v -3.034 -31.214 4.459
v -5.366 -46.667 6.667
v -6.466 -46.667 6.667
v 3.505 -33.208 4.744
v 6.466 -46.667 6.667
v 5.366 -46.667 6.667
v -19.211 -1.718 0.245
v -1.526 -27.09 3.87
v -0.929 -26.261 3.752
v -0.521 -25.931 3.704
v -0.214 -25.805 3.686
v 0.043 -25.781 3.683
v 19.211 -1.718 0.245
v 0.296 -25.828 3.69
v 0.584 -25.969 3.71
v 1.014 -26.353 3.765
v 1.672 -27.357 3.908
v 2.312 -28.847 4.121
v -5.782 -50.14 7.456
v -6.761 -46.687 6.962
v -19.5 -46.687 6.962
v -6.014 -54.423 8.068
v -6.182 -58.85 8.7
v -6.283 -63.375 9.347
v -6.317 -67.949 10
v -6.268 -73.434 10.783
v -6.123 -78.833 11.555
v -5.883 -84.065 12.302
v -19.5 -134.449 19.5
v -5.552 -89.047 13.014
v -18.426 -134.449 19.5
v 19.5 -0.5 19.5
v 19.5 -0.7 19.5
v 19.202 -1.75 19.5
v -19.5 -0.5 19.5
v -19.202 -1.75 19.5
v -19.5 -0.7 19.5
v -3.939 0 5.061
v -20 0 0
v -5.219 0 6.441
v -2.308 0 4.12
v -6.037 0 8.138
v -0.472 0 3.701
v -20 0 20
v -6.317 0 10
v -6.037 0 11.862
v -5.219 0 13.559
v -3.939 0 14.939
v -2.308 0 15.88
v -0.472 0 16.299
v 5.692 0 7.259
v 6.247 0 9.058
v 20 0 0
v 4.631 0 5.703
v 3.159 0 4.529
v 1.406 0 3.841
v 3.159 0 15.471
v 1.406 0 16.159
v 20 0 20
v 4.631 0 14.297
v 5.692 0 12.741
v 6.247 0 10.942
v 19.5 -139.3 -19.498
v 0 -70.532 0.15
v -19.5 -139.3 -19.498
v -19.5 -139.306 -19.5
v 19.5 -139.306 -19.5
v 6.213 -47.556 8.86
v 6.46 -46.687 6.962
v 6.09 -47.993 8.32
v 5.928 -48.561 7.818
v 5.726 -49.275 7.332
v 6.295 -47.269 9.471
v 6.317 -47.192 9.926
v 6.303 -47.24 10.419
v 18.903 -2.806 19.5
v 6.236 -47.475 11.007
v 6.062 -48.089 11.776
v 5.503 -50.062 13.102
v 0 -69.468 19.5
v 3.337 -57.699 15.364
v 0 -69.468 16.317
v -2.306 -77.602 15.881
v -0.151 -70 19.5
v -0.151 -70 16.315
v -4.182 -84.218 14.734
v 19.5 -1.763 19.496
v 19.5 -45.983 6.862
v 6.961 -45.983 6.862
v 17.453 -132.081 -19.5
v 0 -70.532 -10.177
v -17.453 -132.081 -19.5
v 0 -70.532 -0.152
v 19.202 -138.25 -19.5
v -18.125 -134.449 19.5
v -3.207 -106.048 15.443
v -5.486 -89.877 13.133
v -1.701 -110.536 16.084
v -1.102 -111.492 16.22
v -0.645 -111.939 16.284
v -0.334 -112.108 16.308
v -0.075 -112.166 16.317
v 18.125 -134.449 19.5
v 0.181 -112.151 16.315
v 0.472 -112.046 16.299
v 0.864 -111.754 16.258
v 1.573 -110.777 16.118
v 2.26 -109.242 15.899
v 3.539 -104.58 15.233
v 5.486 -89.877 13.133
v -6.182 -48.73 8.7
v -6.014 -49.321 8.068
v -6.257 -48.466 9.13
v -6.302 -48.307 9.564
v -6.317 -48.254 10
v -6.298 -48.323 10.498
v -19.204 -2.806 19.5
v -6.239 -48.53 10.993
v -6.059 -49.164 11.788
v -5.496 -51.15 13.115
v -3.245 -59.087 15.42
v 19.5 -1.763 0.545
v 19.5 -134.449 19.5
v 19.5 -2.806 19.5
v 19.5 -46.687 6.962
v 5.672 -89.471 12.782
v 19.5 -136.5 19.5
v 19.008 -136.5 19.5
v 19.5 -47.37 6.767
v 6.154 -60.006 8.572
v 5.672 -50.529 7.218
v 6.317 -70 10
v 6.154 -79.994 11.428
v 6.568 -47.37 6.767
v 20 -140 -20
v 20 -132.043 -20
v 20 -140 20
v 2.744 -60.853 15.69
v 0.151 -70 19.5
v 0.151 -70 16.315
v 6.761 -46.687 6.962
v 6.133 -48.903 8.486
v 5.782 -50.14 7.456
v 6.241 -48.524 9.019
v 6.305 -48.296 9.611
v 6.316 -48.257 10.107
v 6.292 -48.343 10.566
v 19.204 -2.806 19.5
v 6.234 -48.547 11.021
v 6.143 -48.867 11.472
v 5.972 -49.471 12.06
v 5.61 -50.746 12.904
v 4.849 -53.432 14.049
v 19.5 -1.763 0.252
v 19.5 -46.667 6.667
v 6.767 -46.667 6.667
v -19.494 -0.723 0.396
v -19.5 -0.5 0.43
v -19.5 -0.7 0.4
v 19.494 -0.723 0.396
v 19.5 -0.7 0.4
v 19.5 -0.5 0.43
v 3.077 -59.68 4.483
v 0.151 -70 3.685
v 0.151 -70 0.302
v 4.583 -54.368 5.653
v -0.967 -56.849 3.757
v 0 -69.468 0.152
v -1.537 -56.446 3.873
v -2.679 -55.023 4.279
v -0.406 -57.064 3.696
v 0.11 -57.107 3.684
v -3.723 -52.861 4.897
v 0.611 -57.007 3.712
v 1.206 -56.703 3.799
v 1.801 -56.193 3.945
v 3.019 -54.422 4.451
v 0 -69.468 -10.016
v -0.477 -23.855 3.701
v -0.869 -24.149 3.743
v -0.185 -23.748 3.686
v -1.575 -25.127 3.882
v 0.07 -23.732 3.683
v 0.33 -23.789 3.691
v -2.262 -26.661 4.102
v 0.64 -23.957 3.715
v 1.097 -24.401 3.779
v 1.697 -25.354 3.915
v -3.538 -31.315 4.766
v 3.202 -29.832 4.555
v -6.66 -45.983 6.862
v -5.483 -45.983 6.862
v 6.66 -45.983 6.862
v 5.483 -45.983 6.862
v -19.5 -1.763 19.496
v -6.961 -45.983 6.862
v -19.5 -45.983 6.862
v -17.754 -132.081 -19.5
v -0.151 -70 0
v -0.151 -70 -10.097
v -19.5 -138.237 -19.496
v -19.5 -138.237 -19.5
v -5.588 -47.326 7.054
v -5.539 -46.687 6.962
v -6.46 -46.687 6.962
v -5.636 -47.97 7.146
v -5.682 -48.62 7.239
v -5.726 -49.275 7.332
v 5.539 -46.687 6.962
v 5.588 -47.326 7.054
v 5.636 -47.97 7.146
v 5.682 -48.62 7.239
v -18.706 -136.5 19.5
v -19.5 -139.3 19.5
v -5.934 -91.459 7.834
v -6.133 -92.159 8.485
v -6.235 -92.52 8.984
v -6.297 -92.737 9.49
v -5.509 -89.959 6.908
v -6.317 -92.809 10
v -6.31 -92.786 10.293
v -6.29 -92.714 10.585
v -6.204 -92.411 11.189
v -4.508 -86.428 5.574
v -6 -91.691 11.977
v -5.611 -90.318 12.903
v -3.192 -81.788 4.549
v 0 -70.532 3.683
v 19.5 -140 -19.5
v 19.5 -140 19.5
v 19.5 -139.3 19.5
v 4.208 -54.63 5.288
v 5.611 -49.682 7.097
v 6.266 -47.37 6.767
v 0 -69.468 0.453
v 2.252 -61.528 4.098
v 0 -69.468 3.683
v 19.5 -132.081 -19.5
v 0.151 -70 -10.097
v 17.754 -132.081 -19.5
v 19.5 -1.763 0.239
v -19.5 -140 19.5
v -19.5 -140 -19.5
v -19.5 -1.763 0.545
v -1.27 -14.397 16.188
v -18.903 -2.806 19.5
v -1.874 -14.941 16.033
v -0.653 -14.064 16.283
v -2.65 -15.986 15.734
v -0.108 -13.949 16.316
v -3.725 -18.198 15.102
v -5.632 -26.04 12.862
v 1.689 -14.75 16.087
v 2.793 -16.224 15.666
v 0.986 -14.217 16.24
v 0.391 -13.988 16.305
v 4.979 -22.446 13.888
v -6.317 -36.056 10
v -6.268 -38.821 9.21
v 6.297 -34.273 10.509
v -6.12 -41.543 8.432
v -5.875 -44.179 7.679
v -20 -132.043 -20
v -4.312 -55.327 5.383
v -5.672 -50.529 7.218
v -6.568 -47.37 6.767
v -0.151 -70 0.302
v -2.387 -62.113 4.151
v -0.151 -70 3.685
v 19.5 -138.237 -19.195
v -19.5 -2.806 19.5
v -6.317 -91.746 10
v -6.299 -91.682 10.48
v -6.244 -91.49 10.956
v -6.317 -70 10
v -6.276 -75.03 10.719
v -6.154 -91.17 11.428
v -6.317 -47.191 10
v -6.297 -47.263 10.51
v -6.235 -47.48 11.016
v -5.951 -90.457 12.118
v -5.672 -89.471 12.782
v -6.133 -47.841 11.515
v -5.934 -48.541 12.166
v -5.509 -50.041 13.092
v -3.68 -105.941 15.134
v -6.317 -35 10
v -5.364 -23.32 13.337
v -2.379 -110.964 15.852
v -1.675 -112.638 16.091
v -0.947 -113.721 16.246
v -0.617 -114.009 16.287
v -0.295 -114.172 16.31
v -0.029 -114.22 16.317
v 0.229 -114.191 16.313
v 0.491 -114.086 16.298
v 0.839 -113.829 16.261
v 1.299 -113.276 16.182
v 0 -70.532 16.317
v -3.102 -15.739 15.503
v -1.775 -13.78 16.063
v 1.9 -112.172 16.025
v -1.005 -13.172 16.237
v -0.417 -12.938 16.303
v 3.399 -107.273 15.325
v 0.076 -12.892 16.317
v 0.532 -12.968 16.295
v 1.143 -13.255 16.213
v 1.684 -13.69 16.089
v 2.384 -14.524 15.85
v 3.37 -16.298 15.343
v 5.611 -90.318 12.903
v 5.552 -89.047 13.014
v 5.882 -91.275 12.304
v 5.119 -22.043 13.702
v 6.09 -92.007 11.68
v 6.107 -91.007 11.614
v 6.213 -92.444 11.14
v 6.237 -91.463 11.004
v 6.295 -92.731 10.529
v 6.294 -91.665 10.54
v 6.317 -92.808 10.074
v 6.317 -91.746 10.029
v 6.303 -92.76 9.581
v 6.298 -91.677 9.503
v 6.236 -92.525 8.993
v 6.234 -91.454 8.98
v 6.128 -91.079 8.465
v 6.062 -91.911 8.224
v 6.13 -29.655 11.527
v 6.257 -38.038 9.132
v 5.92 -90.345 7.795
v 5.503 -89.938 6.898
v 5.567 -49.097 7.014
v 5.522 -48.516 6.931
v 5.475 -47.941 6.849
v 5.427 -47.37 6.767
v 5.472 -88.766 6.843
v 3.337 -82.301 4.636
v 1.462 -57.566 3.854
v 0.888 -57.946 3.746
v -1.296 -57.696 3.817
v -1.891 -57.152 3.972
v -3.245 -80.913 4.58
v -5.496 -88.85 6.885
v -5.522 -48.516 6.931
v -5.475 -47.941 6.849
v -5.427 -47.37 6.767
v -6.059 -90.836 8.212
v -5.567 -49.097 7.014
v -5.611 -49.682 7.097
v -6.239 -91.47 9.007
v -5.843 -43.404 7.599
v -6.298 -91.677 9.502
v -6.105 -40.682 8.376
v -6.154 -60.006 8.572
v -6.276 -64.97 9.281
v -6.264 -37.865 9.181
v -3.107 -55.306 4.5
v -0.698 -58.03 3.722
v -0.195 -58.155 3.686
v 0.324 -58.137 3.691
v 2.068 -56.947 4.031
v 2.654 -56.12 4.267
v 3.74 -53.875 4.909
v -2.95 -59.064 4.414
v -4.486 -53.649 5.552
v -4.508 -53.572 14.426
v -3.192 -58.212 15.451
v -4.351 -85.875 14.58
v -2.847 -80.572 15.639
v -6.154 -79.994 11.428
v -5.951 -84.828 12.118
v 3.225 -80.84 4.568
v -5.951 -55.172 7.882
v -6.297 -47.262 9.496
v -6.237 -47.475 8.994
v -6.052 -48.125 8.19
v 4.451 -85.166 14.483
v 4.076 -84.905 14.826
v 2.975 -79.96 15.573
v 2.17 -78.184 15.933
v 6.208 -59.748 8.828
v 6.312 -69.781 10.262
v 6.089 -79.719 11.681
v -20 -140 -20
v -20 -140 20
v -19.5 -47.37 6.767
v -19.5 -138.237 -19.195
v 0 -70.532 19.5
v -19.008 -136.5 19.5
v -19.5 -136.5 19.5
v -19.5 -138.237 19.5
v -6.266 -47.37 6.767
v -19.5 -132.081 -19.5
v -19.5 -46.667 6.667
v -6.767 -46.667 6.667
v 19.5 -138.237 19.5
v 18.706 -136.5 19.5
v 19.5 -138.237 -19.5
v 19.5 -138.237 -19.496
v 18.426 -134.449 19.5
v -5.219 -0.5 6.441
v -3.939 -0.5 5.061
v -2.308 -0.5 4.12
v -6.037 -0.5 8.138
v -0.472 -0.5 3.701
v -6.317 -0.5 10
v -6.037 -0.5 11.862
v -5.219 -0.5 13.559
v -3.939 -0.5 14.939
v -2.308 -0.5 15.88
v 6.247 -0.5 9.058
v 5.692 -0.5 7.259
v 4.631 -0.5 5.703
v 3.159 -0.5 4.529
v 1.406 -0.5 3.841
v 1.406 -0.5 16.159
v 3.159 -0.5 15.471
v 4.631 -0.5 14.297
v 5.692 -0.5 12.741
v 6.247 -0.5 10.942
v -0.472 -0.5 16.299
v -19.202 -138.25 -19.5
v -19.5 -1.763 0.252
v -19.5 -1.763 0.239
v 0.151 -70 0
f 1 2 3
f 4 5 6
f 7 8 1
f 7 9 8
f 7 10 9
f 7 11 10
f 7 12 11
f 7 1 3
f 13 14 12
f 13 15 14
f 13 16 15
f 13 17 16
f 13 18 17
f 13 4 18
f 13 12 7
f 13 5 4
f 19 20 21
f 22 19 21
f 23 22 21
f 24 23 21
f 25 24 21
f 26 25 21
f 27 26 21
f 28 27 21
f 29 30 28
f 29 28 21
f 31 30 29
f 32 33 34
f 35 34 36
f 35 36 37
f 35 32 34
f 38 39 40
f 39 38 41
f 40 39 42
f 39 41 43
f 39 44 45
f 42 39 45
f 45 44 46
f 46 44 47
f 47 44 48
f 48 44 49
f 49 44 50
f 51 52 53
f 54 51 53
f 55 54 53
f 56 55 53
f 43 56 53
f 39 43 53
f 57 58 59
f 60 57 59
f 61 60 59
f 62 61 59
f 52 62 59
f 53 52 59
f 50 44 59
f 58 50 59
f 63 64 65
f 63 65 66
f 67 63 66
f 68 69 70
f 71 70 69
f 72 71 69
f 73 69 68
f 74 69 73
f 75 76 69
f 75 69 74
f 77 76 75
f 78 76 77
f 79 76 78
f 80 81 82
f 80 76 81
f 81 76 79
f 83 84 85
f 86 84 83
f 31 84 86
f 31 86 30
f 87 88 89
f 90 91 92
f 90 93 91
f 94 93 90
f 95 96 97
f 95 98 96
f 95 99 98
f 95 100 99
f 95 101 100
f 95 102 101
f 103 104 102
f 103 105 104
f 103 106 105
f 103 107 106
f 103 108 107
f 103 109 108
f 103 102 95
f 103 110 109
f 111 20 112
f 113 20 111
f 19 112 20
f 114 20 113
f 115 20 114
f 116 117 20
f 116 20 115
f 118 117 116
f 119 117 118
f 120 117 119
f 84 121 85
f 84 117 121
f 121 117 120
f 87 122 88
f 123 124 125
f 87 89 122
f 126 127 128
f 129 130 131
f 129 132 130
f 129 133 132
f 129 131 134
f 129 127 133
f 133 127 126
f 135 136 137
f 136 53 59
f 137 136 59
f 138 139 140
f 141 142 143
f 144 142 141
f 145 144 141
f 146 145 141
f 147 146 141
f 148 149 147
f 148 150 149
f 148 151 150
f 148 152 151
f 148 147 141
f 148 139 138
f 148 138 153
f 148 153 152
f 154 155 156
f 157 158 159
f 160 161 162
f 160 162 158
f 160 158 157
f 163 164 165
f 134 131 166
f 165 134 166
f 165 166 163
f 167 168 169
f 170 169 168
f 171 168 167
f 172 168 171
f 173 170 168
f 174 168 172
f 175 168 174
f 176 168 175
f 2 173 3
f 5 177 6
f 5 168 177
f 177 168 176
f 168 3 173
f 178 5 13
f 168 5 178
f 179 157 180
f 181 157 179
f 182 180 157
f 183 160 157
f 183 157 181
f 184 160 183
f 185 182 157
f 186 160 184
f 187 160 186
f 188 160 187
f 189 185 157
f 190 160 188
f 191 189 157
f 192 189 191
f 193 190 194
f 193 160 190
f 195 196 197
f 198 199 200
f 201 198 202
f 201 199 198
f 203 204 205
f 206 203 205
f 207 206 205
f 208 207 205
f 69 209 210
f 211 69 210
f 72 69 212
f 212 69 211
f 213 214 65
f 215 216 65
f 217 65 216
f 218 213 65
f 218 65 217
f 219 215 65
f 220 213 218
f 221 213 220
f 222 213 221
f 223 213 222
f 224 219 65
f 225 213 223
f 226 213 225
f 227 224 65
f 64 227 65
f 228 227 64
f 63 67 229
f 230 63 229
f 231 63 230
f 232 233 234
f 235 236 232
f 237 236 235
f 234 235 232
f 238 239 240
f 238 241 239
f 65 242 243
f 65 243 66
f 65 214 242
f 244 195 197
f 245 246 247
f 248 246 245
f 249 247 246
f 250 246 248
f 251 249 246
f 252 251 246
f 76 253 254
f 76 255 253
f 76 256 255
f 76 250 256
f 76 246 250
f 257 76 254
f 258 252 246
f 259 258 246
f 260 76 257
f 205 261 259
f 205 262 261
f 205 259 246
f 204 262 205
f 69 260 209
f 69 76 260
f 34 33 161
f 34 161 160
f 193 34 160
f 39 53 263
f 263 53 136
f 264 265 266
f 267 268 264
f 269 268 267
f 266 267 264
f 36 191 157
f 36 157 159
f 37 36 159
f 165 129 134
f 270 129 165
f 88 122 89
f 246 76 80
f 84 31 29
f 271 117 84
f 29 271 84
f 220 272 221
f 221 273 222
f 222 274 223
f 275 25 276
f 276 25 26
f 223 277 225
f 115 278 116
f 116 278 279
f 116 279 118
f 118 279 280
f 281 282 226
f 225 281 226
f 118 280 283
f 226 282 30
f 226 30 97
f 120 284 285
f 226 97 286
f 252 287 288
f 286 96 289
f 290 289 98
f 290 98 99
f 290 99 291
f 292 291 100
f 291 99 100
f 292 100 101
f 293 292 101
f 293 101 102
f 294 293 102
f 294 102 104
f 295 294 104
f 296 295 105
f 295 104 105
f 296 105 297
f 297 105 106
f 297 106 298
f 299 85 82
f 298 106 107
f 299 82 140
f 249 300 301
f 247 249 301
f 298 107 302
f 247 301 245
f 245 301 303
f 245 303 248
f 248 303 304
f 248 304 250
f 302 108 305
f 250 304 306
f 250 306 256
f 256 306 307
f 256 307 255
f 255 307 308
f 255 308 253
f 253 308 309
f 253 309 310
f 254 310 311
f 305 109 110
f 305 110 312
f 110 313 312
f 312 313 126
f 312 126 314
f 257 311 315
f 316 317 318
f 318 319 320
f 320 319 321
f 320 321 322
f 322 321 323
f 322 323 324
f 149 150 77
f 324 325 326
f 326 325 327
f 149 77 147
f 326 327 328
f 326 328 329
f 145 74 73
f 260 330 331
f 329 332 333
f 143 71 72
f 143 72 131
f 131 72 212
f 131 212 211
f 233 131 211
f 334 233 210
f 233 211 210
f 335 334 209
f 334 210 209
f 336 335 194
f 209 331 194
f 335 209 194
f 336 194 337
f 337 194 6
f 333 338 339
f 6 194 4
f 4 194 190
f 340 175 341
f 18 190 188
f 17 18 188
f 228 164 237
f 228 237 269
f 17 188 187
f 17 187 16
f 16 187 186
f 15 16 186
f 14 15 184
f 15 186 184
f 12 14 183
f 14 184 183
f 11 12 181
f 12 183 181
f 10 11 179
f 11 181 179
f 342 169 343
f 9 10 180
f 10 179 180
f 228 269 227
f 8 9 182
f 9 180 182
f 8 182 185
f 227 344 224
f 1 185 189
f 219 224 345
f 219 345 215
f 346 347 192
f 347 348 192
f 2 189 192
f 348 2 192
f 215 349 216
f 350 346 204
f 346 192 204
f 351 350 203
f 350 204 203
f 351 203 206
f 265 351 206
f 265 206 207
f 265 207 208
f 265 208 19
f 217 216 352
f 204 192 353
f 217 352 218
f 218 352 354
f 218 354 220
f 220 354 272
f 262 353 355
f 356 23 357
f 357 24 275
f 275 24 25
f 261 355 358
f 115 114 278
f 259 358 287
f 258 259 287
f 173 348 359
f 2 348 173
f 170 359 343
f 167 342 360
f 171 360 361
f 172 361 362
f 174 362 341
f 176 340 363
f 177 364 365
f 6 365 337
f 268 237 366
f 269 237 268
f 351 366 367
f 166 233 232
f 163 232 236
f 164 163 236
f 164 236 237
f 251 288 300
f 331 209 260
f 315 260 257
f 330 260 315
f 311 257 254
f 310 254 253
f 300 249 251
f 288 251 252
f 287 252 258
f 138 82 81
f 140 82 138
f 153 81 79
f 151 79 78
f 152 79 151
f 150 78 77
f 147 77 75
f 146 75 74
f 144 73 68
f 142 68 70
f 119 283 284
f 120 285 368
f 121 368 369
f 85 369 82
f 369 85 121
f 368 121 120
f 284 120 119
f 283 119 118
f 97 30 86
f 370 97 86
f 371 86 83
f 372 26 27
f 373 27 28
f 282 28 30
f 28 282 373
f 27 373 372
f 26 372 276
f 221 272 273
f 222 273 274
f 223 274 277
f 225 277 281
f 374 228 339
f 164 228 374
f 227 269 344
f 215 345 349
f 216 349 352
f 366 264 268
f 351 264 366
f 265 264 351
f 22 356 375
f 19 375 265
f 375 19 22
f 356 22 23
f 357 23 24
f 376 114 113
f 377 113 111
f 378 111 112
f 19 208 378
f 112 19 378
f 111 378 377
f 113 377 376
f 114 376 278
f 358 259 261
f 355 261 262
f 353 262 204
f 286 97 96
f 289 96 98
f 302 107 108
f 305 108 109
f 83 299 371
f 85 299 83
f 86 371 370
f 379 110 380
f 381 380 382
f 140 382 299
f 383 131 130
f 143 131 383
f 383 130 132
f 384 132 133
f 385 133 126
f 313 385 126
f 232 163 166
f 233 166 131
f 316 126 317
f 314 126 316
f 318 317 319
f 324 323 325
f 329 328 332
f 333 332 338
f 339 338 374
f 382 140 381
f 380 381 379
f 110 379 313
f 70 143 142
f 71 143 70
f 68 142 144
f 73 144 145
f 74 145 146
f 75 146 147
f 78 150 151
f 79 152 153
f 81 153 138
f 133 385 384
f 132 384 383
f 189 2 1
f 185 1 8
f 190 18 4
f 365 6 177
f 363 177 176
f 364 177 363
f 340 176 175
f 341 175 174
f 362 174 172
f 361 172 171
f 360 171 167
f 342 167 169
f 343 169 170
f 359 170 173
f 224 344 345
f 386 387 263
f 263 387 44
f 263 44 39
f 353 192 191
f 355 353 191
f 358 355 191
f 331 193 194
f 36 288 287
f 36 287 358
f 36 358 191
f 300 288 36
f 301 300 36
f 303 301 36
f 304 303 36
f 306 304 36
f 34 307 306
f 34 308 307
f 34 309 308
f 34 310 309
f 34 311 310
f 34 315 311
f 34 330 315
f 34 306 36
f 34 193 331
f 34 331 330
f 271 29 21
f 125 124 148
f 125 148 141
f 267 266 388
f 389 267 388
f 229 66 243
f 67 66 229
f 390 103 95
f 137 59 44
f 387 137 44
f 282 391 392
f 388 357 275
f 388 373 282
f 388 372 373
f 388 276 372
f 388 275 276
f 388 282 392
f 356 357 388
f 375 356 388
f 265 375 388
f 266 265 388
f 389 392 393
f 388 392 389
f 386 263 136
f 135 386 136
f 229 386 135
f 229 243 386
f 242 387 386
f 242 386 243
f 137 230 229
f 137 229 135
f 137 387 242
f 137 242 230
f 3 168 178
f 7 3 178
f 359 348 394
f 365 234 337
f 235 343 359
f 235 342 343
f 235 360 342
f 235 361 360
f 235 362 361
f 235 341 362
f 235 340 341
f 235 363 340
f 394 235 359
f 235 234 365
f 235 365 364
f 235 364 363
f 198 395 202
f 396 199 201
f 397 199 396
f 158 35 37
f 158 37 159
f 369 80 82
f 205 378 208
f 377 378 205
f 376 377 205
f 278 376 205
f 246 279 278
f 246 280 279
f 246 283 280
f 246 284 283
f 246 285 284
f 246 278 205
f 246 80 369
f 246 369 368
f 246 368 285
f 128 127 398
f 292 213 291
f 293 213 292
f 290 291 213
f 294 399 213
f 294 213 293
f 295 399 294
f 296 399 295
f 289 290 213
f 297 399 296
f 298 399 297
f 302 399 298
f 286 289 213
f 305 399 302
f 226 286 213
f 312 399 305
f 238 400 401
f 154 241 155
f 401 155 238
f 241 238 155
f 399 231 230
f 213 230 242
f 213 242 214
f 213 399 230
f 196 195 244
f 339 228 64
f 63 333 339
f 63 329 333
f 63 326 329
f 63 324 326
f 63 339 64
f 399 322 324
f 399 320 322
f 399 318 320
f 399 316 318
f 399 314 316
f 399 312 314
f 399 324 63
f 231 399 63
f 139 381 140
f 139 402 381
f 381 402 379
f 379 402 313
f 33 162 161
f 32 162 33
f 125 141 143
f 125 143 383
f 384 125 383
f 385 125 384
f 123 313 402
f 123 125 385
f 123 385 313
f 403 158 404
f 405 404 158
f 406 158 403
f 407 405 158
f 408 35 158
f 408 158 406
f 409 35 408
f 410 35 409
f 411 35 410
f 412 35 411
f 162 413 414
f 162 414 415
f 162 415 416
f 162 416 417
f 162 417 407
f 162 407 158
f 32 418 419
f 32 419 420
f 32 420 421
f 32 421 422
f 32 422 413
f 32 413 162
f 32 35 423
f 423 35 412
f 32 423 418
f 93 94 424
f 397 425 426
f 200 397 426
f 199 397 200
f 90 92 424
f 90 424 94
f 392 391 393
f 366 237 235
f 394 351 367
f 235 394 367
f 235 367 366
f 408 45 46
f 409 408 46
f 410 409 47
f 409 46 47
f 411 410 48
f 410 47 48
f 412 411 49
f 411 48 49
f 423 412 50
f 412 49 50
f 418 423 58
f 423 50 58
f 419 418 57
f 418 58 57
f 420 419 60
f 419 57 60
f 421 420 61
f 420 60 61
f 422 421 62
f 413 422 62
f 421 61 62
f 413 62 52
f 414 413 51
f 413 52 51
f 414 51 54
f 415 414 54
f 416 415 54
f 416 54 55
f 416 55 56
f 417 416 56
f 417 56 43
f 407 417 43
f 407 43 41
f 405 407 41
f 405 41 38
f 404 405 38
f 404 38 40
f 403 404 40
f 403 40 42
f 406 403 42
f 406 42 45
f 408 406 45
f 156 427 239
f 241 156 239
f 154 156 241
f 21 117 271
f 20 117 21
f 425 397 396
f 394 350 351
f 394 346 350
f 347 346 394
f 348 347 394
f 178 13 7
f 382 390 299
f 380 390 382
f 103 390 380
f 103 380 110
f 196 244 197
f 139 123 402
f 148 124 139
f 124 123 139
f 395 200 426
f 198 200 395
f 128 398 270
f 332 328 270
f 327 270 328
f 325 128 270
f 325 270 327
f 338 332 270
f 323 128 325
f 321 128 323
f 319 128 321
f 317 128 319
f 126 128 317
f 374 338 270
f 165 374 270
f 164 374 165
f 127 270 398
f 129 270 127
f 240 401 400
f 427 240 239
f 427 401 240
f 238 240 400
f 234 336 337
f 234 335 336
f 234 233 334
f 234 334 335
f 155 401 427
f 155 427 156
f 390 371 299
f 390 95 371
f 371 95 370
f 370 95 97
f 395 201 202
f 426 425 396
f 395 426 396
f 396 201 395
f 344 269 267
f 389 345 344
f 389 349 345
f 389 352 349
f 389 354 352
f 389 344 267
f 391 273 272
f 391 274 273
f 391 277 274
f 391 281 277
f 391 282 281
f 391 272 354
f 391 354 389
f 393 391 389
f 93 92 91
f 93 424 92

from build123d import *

# Parameters (mm, degrees)
F0_W      = 34
F0_H      = 1.332180649
F0_W_2    = 3
F0_H_2    = 30
F1_DEPTH  = 140
F3_DEPTH  = 50
F4_DEPTH  = 40
F5_T      = -0.5
F7_REACH  = 112.8020988928
F9_DEPTH  = 40
F11_DEPTH = 1000
F12_R     = 6.3171610822
F13_DEPTH = 140


# Not quite as in the source:
# - a feature names something its author has since deleted; it is built from what else it names


with BuildPart() as f1:
    # F0 (on Front) → F1 (new body)
    with BuildSketch(Plane.XZ):
        Polygon((20, 20), (17, 20), (17, 18.832180649), (17, 17.5), (17, 15), (20, 15), align=None)
        Polygon((15, 20), (-15, 20), (-17, 20), (-17, 18.832180649), (17, 18.832180649), (17, 20), align=None)
        with Locations((0, 18.1660903245)):
            Rectangle(F0_W, F0_H)
        Polygon((17, 17.5), (-17, 17.5), (-17, 15), (-17, -15), (-15, -15), (15, -15), (17, -15), (17, 15), align=None)
        Polygon((-18.5, 15), (-20, 15), (-20, -11.8550653383), (-20, -15), (-18.5, -15), (-18.5, -5.2632528394), (-18.5, -3.2632528394), (-18.5, 2.7367471606), (-18.5, 4.7367471606), align=None)
        with Locations((18.5, 0)):
            Rectangle(F0_W_2, F0_H_2)
        with BuildLine():
            Line((-15, -20), (15, -20))
            Line((15, -20), (15, -17.5))
            Line((15, -17.5), (11.391207267, -17.5))
            ThreePointArc((11.391207267, -17.5), (10.2485464886, -18.6426607784), (9.1058857102, -17.5))
            Line((9.1058857102, -17.5), (7.9234171988, -17.5))
            ThreePointArc((7.9234171988, -17.5), (5.948765669, -19.4746515298), (3.9741141393, -17.5))
            Line((3.9741141393, -17.5), (2.0740236579, -17.5))
            ThreePointArc((2.0740236579, -17.5), (0, -19.5740236579), (-2.0740236579, -17.5))
            Line((-2.0740236579, -17.5), (-3.9741141393, -17.5))
            ThreePointArc((-3.9741141393, -17.5), (-5.948765669, -19.4746515298), (-7.9234171988, -17.5))
            Line((-7.9234171988, -17.5), (-9.1058857102, -17.5))
            ThreePointArc((-9.1058857102, -17.5), (-10.2485464886, -18.6426607784), (-11.391207267, -17.5))
            Line((-11.391207267, -17.5), (-15, -17.5))
            Line((-15, -17.5), (-15, -20))
        make_face()
        Polygon((20, -20), (20, -15), (17, -15), (15, -15), (15, -17.5), (15, -20), align=None)
        Polygon((-17, -15), (-17, 15), (-18.5, 15), (-18.5, 4.7367471606), (-18.5, 2.7367471606), (-18.5, -3.2632528394), (-18.5, -5.2632528394), (-18.5, -15), align=None)
        Polygon((-15, -17.5), (-15, -15), (-16.767766953, -16.767766953), (-17.5, -17.5), (-15, -20), align=None)
        Polygon((-15, -15), (-17, -15), (-18.5, -15), (-20, -15), (-17.5, -17.5), (-16.767766953, -16.767766953), align=None)
        Polygon((-17, 18.832180649), (-17, 20), (-20, 20), (-20, 15), (-18.5, 15), (-17, 15), (-17, 17.5), align=None)
        Polygon((-17.5, -17.5), (-20, -15), (-20, -20), (-15, -20), align=None)
        with BuildLine():
            Line((3.9741141393, -17.5), (7.9234171988, -17.5))
            ThreePointArc((7.9234171988, -17.5), (5.948765669, -15.5253484702), (3.9741141393, -17.5))
        make_face()
        with BuildLine():
            ThreePointArc((3.9741141393, -17.5), (5.948765669, -19.4746515298), (7.9234171988, -17.5))
            Line((7.9234171988, -17.5), (3.9741141393, -17.5))
        make_face()
        with BuildLine():
            ThreePointArc((9.1058857102, -17.5), (10.2485464886, -18.6426607784), (11.391207267, -17.5))
            Line((11.391207267, -17.5), (9.1058857102, -17.5))
        make_face()
        with BuildLine():
            Line((9.1058857102, -17.5), (11.391207267, -17.5))
            ThreePointArc((11.391207267, -17.5), (10.2485464886, -16.3573392216), (9.1058857102, -17.5))
        make_face()
        with BuildLine():
            ThreePointArc((2.0740236579, -17.5), (0, -15.4259763421), (-2.0740236579, -17.5))
            Line((-2.0740236579, -17.5), (2.0740236579, -17.5))
        make_face()
        with BuildLine():
            Line((2.0740236579, -17.5), (-2.0740236579, -17.5))
            ThreePointArc((-2.0740236579, -17.5), (0, -19.5740236579), (2.0740236579, -17.5))
        make_face()
        with BuildLine():
            Line((-3.9741141393, -17.5), (-7.9234171988, -17.5))
            ThreePointArc((-7.9234171988, -17.5), (-5.948765669, -19.4746515298), (-3.9741141393, -17.5))
        make_face()
    extrude(amount=F1_DEPTH)


with BuildPart() as f1b:
    # F0 (on Front) → F1, piece 2 (new body)
    with BuildSketch(Plane.XZ):
        with BuildLine():
            ThreePointArc((-9.1058857102, -17.5), (-10.2485464886, -16.3573392216), (-11.391207267, -17.5))
            Line((-11.391207267, -17.5), (-9.1058857102, -17.5))
        make_face()
    extrude(amount=F1_DEPTH)


with BuildPart() as f3_tool:
    # F2 (on face) → F3 (new body)
    with BuildSketch(Plane.YZ.offset(20)):
        Polygon((0, 0), (-132.0431083441, -20), (0, -20), align=None)
    extrude(amount=-F3_DEPTH)


with BuildPart() as f1_1:
    add(f1.part)

    # F3: cut by f3_tool
    add(f3_tool.part, mode=Mode.SUBTRACT)



with BuildPart() as f1b_1:
    add(f1b.part)

    # F3: cut by f3_tool
    add(f3_tool.part, mode=Mode.SUBTRACT)


with BuildPart() as f1_2:
    add(f1_1.part)

    add(f1b_1.part)  # F4 merges F1b
    # F2 (on face) → F4 (join)
    with BuildSketch(Plane.YZ.offset(20)):
        Polygon((-133.1249161121, -12.857736984), (-132.0431083441, -20), (0, 0), (0, 7.3061197718), align=None)
        Polygon((-140, -20), (-132.0431083441, -20), (-133.1249161121, -12.857736984), (-140, -13.8990762821), align=None)
    extrude(amount=-F4_DEPTH)

    # F5
    f5_openings = [f1_2.faces().sort_by_distance(p)[0] for p in [
        (0, -140, 0),
    ]]
    offset(amount=F5_T, openings=f5_openings)

    f7_end = Plane(origin=(0, -66.021554172, -10), x_dir=(0, -0.988722747, -0.1497575692), z_dir=(0, 0.1497575692, -0.988722747))
    # F6 (on face) → F7 (join, up to a plane its end follows)
    with BuildSketch(Plane.XY.offset(20)):
        Polygon((0, -70), (-0.1507168075, -70), (0, -70.5315142328), (0.1507168075, -70), align=None)
        Polygon((0, -69.4684857672), (-0.1507168075, -70), (0, -70), (0.1507168075, -70), align=None)
        Polygon((0.1507168075, -70), (0, -70.5315142328), (19.6985663849, -140), (20, -140), align=None)
        Polygon((0, -70.5315142328), (-0.1507168075, -70), (-20, -140), (-19.6985663849, -140), align=None)
        Polygon((19.6985663849, 0), (0, -69.4684857672), (0.1507168075, -70), (20, 0), align=None)
        Polygon((-19.6985663849, 0), (-20, 0), (-0.1507168075, -70), (0, -69.4684857672), align=None)
    f7_long = extrude(amount=-F7_REACH, mode=Mode.PRIVATE)
    add(split(f7_long, bisect_by=f7_end, keep=Keep.BOTTOM, mode=Mode.PRIVATE))

    # F8 (on face) → F9 (join, through all)
    with BuildSketch(Plane.YZ.offset(20)):
        Polygon((-47.3704106226, 6.7672015175), (-46.6666666667, 6.6666666667), (-45.9831301115, 6.8619628253), (-46.6868740675, 6.9624976761), align=None)
        Polygon((-46.6868740675, 6.9624976761), (-45.9831301115, 6.8619628253), (0, 20), (-1.0556159339, 20), align=None)
        Polygon((-140, 20), (-47.3704106226, 6.7672015175), (-46.6868740675, 6.9624976761), (-137.9493903346, 20), align=None)
        Polygon((-45.9831301115, 6.8619628253), (-46.6666666667, 6.6666666667), (0, 0), (0, 0.2929442379), align=None)
        Polygon((-140, -19.6983954474), (-140, -20), (-46.6666666667, 6.6666666667), (-47.3704106226, 6.7672015175), align=None)
    extrude(amount=-F9_DEPTH)

    # F10 (on face) → F11 (cut)
    with BuildSketch(Plane(origin=(-20, 0, 0), x_dir=(0, -1, 0), z_dir=(-1, 0, 0))):
        Polygon((140, -20), (132.0431083441, -20), (132.0431083441, -21.8775942922), (142.034560442, -23.4243907034), (141.5658295155, -20), align=None)
    extrude(amount=-F11_DEPTH, mode=Mode.SUBTRACT)

    # F12 (on face) → F13 (cut, through all)
    with BuildSketch(Plane(origin=(0, 0, 0), x_dir=(-1, 0, 0), z_dir=(0, 1, 0))):
        with Locations((0, 10)):
            Circle(F12_R)
    extrude(amount=-F13_DEPTH, mode=Mode.SUBTRACT)


solid = f1_2.part
